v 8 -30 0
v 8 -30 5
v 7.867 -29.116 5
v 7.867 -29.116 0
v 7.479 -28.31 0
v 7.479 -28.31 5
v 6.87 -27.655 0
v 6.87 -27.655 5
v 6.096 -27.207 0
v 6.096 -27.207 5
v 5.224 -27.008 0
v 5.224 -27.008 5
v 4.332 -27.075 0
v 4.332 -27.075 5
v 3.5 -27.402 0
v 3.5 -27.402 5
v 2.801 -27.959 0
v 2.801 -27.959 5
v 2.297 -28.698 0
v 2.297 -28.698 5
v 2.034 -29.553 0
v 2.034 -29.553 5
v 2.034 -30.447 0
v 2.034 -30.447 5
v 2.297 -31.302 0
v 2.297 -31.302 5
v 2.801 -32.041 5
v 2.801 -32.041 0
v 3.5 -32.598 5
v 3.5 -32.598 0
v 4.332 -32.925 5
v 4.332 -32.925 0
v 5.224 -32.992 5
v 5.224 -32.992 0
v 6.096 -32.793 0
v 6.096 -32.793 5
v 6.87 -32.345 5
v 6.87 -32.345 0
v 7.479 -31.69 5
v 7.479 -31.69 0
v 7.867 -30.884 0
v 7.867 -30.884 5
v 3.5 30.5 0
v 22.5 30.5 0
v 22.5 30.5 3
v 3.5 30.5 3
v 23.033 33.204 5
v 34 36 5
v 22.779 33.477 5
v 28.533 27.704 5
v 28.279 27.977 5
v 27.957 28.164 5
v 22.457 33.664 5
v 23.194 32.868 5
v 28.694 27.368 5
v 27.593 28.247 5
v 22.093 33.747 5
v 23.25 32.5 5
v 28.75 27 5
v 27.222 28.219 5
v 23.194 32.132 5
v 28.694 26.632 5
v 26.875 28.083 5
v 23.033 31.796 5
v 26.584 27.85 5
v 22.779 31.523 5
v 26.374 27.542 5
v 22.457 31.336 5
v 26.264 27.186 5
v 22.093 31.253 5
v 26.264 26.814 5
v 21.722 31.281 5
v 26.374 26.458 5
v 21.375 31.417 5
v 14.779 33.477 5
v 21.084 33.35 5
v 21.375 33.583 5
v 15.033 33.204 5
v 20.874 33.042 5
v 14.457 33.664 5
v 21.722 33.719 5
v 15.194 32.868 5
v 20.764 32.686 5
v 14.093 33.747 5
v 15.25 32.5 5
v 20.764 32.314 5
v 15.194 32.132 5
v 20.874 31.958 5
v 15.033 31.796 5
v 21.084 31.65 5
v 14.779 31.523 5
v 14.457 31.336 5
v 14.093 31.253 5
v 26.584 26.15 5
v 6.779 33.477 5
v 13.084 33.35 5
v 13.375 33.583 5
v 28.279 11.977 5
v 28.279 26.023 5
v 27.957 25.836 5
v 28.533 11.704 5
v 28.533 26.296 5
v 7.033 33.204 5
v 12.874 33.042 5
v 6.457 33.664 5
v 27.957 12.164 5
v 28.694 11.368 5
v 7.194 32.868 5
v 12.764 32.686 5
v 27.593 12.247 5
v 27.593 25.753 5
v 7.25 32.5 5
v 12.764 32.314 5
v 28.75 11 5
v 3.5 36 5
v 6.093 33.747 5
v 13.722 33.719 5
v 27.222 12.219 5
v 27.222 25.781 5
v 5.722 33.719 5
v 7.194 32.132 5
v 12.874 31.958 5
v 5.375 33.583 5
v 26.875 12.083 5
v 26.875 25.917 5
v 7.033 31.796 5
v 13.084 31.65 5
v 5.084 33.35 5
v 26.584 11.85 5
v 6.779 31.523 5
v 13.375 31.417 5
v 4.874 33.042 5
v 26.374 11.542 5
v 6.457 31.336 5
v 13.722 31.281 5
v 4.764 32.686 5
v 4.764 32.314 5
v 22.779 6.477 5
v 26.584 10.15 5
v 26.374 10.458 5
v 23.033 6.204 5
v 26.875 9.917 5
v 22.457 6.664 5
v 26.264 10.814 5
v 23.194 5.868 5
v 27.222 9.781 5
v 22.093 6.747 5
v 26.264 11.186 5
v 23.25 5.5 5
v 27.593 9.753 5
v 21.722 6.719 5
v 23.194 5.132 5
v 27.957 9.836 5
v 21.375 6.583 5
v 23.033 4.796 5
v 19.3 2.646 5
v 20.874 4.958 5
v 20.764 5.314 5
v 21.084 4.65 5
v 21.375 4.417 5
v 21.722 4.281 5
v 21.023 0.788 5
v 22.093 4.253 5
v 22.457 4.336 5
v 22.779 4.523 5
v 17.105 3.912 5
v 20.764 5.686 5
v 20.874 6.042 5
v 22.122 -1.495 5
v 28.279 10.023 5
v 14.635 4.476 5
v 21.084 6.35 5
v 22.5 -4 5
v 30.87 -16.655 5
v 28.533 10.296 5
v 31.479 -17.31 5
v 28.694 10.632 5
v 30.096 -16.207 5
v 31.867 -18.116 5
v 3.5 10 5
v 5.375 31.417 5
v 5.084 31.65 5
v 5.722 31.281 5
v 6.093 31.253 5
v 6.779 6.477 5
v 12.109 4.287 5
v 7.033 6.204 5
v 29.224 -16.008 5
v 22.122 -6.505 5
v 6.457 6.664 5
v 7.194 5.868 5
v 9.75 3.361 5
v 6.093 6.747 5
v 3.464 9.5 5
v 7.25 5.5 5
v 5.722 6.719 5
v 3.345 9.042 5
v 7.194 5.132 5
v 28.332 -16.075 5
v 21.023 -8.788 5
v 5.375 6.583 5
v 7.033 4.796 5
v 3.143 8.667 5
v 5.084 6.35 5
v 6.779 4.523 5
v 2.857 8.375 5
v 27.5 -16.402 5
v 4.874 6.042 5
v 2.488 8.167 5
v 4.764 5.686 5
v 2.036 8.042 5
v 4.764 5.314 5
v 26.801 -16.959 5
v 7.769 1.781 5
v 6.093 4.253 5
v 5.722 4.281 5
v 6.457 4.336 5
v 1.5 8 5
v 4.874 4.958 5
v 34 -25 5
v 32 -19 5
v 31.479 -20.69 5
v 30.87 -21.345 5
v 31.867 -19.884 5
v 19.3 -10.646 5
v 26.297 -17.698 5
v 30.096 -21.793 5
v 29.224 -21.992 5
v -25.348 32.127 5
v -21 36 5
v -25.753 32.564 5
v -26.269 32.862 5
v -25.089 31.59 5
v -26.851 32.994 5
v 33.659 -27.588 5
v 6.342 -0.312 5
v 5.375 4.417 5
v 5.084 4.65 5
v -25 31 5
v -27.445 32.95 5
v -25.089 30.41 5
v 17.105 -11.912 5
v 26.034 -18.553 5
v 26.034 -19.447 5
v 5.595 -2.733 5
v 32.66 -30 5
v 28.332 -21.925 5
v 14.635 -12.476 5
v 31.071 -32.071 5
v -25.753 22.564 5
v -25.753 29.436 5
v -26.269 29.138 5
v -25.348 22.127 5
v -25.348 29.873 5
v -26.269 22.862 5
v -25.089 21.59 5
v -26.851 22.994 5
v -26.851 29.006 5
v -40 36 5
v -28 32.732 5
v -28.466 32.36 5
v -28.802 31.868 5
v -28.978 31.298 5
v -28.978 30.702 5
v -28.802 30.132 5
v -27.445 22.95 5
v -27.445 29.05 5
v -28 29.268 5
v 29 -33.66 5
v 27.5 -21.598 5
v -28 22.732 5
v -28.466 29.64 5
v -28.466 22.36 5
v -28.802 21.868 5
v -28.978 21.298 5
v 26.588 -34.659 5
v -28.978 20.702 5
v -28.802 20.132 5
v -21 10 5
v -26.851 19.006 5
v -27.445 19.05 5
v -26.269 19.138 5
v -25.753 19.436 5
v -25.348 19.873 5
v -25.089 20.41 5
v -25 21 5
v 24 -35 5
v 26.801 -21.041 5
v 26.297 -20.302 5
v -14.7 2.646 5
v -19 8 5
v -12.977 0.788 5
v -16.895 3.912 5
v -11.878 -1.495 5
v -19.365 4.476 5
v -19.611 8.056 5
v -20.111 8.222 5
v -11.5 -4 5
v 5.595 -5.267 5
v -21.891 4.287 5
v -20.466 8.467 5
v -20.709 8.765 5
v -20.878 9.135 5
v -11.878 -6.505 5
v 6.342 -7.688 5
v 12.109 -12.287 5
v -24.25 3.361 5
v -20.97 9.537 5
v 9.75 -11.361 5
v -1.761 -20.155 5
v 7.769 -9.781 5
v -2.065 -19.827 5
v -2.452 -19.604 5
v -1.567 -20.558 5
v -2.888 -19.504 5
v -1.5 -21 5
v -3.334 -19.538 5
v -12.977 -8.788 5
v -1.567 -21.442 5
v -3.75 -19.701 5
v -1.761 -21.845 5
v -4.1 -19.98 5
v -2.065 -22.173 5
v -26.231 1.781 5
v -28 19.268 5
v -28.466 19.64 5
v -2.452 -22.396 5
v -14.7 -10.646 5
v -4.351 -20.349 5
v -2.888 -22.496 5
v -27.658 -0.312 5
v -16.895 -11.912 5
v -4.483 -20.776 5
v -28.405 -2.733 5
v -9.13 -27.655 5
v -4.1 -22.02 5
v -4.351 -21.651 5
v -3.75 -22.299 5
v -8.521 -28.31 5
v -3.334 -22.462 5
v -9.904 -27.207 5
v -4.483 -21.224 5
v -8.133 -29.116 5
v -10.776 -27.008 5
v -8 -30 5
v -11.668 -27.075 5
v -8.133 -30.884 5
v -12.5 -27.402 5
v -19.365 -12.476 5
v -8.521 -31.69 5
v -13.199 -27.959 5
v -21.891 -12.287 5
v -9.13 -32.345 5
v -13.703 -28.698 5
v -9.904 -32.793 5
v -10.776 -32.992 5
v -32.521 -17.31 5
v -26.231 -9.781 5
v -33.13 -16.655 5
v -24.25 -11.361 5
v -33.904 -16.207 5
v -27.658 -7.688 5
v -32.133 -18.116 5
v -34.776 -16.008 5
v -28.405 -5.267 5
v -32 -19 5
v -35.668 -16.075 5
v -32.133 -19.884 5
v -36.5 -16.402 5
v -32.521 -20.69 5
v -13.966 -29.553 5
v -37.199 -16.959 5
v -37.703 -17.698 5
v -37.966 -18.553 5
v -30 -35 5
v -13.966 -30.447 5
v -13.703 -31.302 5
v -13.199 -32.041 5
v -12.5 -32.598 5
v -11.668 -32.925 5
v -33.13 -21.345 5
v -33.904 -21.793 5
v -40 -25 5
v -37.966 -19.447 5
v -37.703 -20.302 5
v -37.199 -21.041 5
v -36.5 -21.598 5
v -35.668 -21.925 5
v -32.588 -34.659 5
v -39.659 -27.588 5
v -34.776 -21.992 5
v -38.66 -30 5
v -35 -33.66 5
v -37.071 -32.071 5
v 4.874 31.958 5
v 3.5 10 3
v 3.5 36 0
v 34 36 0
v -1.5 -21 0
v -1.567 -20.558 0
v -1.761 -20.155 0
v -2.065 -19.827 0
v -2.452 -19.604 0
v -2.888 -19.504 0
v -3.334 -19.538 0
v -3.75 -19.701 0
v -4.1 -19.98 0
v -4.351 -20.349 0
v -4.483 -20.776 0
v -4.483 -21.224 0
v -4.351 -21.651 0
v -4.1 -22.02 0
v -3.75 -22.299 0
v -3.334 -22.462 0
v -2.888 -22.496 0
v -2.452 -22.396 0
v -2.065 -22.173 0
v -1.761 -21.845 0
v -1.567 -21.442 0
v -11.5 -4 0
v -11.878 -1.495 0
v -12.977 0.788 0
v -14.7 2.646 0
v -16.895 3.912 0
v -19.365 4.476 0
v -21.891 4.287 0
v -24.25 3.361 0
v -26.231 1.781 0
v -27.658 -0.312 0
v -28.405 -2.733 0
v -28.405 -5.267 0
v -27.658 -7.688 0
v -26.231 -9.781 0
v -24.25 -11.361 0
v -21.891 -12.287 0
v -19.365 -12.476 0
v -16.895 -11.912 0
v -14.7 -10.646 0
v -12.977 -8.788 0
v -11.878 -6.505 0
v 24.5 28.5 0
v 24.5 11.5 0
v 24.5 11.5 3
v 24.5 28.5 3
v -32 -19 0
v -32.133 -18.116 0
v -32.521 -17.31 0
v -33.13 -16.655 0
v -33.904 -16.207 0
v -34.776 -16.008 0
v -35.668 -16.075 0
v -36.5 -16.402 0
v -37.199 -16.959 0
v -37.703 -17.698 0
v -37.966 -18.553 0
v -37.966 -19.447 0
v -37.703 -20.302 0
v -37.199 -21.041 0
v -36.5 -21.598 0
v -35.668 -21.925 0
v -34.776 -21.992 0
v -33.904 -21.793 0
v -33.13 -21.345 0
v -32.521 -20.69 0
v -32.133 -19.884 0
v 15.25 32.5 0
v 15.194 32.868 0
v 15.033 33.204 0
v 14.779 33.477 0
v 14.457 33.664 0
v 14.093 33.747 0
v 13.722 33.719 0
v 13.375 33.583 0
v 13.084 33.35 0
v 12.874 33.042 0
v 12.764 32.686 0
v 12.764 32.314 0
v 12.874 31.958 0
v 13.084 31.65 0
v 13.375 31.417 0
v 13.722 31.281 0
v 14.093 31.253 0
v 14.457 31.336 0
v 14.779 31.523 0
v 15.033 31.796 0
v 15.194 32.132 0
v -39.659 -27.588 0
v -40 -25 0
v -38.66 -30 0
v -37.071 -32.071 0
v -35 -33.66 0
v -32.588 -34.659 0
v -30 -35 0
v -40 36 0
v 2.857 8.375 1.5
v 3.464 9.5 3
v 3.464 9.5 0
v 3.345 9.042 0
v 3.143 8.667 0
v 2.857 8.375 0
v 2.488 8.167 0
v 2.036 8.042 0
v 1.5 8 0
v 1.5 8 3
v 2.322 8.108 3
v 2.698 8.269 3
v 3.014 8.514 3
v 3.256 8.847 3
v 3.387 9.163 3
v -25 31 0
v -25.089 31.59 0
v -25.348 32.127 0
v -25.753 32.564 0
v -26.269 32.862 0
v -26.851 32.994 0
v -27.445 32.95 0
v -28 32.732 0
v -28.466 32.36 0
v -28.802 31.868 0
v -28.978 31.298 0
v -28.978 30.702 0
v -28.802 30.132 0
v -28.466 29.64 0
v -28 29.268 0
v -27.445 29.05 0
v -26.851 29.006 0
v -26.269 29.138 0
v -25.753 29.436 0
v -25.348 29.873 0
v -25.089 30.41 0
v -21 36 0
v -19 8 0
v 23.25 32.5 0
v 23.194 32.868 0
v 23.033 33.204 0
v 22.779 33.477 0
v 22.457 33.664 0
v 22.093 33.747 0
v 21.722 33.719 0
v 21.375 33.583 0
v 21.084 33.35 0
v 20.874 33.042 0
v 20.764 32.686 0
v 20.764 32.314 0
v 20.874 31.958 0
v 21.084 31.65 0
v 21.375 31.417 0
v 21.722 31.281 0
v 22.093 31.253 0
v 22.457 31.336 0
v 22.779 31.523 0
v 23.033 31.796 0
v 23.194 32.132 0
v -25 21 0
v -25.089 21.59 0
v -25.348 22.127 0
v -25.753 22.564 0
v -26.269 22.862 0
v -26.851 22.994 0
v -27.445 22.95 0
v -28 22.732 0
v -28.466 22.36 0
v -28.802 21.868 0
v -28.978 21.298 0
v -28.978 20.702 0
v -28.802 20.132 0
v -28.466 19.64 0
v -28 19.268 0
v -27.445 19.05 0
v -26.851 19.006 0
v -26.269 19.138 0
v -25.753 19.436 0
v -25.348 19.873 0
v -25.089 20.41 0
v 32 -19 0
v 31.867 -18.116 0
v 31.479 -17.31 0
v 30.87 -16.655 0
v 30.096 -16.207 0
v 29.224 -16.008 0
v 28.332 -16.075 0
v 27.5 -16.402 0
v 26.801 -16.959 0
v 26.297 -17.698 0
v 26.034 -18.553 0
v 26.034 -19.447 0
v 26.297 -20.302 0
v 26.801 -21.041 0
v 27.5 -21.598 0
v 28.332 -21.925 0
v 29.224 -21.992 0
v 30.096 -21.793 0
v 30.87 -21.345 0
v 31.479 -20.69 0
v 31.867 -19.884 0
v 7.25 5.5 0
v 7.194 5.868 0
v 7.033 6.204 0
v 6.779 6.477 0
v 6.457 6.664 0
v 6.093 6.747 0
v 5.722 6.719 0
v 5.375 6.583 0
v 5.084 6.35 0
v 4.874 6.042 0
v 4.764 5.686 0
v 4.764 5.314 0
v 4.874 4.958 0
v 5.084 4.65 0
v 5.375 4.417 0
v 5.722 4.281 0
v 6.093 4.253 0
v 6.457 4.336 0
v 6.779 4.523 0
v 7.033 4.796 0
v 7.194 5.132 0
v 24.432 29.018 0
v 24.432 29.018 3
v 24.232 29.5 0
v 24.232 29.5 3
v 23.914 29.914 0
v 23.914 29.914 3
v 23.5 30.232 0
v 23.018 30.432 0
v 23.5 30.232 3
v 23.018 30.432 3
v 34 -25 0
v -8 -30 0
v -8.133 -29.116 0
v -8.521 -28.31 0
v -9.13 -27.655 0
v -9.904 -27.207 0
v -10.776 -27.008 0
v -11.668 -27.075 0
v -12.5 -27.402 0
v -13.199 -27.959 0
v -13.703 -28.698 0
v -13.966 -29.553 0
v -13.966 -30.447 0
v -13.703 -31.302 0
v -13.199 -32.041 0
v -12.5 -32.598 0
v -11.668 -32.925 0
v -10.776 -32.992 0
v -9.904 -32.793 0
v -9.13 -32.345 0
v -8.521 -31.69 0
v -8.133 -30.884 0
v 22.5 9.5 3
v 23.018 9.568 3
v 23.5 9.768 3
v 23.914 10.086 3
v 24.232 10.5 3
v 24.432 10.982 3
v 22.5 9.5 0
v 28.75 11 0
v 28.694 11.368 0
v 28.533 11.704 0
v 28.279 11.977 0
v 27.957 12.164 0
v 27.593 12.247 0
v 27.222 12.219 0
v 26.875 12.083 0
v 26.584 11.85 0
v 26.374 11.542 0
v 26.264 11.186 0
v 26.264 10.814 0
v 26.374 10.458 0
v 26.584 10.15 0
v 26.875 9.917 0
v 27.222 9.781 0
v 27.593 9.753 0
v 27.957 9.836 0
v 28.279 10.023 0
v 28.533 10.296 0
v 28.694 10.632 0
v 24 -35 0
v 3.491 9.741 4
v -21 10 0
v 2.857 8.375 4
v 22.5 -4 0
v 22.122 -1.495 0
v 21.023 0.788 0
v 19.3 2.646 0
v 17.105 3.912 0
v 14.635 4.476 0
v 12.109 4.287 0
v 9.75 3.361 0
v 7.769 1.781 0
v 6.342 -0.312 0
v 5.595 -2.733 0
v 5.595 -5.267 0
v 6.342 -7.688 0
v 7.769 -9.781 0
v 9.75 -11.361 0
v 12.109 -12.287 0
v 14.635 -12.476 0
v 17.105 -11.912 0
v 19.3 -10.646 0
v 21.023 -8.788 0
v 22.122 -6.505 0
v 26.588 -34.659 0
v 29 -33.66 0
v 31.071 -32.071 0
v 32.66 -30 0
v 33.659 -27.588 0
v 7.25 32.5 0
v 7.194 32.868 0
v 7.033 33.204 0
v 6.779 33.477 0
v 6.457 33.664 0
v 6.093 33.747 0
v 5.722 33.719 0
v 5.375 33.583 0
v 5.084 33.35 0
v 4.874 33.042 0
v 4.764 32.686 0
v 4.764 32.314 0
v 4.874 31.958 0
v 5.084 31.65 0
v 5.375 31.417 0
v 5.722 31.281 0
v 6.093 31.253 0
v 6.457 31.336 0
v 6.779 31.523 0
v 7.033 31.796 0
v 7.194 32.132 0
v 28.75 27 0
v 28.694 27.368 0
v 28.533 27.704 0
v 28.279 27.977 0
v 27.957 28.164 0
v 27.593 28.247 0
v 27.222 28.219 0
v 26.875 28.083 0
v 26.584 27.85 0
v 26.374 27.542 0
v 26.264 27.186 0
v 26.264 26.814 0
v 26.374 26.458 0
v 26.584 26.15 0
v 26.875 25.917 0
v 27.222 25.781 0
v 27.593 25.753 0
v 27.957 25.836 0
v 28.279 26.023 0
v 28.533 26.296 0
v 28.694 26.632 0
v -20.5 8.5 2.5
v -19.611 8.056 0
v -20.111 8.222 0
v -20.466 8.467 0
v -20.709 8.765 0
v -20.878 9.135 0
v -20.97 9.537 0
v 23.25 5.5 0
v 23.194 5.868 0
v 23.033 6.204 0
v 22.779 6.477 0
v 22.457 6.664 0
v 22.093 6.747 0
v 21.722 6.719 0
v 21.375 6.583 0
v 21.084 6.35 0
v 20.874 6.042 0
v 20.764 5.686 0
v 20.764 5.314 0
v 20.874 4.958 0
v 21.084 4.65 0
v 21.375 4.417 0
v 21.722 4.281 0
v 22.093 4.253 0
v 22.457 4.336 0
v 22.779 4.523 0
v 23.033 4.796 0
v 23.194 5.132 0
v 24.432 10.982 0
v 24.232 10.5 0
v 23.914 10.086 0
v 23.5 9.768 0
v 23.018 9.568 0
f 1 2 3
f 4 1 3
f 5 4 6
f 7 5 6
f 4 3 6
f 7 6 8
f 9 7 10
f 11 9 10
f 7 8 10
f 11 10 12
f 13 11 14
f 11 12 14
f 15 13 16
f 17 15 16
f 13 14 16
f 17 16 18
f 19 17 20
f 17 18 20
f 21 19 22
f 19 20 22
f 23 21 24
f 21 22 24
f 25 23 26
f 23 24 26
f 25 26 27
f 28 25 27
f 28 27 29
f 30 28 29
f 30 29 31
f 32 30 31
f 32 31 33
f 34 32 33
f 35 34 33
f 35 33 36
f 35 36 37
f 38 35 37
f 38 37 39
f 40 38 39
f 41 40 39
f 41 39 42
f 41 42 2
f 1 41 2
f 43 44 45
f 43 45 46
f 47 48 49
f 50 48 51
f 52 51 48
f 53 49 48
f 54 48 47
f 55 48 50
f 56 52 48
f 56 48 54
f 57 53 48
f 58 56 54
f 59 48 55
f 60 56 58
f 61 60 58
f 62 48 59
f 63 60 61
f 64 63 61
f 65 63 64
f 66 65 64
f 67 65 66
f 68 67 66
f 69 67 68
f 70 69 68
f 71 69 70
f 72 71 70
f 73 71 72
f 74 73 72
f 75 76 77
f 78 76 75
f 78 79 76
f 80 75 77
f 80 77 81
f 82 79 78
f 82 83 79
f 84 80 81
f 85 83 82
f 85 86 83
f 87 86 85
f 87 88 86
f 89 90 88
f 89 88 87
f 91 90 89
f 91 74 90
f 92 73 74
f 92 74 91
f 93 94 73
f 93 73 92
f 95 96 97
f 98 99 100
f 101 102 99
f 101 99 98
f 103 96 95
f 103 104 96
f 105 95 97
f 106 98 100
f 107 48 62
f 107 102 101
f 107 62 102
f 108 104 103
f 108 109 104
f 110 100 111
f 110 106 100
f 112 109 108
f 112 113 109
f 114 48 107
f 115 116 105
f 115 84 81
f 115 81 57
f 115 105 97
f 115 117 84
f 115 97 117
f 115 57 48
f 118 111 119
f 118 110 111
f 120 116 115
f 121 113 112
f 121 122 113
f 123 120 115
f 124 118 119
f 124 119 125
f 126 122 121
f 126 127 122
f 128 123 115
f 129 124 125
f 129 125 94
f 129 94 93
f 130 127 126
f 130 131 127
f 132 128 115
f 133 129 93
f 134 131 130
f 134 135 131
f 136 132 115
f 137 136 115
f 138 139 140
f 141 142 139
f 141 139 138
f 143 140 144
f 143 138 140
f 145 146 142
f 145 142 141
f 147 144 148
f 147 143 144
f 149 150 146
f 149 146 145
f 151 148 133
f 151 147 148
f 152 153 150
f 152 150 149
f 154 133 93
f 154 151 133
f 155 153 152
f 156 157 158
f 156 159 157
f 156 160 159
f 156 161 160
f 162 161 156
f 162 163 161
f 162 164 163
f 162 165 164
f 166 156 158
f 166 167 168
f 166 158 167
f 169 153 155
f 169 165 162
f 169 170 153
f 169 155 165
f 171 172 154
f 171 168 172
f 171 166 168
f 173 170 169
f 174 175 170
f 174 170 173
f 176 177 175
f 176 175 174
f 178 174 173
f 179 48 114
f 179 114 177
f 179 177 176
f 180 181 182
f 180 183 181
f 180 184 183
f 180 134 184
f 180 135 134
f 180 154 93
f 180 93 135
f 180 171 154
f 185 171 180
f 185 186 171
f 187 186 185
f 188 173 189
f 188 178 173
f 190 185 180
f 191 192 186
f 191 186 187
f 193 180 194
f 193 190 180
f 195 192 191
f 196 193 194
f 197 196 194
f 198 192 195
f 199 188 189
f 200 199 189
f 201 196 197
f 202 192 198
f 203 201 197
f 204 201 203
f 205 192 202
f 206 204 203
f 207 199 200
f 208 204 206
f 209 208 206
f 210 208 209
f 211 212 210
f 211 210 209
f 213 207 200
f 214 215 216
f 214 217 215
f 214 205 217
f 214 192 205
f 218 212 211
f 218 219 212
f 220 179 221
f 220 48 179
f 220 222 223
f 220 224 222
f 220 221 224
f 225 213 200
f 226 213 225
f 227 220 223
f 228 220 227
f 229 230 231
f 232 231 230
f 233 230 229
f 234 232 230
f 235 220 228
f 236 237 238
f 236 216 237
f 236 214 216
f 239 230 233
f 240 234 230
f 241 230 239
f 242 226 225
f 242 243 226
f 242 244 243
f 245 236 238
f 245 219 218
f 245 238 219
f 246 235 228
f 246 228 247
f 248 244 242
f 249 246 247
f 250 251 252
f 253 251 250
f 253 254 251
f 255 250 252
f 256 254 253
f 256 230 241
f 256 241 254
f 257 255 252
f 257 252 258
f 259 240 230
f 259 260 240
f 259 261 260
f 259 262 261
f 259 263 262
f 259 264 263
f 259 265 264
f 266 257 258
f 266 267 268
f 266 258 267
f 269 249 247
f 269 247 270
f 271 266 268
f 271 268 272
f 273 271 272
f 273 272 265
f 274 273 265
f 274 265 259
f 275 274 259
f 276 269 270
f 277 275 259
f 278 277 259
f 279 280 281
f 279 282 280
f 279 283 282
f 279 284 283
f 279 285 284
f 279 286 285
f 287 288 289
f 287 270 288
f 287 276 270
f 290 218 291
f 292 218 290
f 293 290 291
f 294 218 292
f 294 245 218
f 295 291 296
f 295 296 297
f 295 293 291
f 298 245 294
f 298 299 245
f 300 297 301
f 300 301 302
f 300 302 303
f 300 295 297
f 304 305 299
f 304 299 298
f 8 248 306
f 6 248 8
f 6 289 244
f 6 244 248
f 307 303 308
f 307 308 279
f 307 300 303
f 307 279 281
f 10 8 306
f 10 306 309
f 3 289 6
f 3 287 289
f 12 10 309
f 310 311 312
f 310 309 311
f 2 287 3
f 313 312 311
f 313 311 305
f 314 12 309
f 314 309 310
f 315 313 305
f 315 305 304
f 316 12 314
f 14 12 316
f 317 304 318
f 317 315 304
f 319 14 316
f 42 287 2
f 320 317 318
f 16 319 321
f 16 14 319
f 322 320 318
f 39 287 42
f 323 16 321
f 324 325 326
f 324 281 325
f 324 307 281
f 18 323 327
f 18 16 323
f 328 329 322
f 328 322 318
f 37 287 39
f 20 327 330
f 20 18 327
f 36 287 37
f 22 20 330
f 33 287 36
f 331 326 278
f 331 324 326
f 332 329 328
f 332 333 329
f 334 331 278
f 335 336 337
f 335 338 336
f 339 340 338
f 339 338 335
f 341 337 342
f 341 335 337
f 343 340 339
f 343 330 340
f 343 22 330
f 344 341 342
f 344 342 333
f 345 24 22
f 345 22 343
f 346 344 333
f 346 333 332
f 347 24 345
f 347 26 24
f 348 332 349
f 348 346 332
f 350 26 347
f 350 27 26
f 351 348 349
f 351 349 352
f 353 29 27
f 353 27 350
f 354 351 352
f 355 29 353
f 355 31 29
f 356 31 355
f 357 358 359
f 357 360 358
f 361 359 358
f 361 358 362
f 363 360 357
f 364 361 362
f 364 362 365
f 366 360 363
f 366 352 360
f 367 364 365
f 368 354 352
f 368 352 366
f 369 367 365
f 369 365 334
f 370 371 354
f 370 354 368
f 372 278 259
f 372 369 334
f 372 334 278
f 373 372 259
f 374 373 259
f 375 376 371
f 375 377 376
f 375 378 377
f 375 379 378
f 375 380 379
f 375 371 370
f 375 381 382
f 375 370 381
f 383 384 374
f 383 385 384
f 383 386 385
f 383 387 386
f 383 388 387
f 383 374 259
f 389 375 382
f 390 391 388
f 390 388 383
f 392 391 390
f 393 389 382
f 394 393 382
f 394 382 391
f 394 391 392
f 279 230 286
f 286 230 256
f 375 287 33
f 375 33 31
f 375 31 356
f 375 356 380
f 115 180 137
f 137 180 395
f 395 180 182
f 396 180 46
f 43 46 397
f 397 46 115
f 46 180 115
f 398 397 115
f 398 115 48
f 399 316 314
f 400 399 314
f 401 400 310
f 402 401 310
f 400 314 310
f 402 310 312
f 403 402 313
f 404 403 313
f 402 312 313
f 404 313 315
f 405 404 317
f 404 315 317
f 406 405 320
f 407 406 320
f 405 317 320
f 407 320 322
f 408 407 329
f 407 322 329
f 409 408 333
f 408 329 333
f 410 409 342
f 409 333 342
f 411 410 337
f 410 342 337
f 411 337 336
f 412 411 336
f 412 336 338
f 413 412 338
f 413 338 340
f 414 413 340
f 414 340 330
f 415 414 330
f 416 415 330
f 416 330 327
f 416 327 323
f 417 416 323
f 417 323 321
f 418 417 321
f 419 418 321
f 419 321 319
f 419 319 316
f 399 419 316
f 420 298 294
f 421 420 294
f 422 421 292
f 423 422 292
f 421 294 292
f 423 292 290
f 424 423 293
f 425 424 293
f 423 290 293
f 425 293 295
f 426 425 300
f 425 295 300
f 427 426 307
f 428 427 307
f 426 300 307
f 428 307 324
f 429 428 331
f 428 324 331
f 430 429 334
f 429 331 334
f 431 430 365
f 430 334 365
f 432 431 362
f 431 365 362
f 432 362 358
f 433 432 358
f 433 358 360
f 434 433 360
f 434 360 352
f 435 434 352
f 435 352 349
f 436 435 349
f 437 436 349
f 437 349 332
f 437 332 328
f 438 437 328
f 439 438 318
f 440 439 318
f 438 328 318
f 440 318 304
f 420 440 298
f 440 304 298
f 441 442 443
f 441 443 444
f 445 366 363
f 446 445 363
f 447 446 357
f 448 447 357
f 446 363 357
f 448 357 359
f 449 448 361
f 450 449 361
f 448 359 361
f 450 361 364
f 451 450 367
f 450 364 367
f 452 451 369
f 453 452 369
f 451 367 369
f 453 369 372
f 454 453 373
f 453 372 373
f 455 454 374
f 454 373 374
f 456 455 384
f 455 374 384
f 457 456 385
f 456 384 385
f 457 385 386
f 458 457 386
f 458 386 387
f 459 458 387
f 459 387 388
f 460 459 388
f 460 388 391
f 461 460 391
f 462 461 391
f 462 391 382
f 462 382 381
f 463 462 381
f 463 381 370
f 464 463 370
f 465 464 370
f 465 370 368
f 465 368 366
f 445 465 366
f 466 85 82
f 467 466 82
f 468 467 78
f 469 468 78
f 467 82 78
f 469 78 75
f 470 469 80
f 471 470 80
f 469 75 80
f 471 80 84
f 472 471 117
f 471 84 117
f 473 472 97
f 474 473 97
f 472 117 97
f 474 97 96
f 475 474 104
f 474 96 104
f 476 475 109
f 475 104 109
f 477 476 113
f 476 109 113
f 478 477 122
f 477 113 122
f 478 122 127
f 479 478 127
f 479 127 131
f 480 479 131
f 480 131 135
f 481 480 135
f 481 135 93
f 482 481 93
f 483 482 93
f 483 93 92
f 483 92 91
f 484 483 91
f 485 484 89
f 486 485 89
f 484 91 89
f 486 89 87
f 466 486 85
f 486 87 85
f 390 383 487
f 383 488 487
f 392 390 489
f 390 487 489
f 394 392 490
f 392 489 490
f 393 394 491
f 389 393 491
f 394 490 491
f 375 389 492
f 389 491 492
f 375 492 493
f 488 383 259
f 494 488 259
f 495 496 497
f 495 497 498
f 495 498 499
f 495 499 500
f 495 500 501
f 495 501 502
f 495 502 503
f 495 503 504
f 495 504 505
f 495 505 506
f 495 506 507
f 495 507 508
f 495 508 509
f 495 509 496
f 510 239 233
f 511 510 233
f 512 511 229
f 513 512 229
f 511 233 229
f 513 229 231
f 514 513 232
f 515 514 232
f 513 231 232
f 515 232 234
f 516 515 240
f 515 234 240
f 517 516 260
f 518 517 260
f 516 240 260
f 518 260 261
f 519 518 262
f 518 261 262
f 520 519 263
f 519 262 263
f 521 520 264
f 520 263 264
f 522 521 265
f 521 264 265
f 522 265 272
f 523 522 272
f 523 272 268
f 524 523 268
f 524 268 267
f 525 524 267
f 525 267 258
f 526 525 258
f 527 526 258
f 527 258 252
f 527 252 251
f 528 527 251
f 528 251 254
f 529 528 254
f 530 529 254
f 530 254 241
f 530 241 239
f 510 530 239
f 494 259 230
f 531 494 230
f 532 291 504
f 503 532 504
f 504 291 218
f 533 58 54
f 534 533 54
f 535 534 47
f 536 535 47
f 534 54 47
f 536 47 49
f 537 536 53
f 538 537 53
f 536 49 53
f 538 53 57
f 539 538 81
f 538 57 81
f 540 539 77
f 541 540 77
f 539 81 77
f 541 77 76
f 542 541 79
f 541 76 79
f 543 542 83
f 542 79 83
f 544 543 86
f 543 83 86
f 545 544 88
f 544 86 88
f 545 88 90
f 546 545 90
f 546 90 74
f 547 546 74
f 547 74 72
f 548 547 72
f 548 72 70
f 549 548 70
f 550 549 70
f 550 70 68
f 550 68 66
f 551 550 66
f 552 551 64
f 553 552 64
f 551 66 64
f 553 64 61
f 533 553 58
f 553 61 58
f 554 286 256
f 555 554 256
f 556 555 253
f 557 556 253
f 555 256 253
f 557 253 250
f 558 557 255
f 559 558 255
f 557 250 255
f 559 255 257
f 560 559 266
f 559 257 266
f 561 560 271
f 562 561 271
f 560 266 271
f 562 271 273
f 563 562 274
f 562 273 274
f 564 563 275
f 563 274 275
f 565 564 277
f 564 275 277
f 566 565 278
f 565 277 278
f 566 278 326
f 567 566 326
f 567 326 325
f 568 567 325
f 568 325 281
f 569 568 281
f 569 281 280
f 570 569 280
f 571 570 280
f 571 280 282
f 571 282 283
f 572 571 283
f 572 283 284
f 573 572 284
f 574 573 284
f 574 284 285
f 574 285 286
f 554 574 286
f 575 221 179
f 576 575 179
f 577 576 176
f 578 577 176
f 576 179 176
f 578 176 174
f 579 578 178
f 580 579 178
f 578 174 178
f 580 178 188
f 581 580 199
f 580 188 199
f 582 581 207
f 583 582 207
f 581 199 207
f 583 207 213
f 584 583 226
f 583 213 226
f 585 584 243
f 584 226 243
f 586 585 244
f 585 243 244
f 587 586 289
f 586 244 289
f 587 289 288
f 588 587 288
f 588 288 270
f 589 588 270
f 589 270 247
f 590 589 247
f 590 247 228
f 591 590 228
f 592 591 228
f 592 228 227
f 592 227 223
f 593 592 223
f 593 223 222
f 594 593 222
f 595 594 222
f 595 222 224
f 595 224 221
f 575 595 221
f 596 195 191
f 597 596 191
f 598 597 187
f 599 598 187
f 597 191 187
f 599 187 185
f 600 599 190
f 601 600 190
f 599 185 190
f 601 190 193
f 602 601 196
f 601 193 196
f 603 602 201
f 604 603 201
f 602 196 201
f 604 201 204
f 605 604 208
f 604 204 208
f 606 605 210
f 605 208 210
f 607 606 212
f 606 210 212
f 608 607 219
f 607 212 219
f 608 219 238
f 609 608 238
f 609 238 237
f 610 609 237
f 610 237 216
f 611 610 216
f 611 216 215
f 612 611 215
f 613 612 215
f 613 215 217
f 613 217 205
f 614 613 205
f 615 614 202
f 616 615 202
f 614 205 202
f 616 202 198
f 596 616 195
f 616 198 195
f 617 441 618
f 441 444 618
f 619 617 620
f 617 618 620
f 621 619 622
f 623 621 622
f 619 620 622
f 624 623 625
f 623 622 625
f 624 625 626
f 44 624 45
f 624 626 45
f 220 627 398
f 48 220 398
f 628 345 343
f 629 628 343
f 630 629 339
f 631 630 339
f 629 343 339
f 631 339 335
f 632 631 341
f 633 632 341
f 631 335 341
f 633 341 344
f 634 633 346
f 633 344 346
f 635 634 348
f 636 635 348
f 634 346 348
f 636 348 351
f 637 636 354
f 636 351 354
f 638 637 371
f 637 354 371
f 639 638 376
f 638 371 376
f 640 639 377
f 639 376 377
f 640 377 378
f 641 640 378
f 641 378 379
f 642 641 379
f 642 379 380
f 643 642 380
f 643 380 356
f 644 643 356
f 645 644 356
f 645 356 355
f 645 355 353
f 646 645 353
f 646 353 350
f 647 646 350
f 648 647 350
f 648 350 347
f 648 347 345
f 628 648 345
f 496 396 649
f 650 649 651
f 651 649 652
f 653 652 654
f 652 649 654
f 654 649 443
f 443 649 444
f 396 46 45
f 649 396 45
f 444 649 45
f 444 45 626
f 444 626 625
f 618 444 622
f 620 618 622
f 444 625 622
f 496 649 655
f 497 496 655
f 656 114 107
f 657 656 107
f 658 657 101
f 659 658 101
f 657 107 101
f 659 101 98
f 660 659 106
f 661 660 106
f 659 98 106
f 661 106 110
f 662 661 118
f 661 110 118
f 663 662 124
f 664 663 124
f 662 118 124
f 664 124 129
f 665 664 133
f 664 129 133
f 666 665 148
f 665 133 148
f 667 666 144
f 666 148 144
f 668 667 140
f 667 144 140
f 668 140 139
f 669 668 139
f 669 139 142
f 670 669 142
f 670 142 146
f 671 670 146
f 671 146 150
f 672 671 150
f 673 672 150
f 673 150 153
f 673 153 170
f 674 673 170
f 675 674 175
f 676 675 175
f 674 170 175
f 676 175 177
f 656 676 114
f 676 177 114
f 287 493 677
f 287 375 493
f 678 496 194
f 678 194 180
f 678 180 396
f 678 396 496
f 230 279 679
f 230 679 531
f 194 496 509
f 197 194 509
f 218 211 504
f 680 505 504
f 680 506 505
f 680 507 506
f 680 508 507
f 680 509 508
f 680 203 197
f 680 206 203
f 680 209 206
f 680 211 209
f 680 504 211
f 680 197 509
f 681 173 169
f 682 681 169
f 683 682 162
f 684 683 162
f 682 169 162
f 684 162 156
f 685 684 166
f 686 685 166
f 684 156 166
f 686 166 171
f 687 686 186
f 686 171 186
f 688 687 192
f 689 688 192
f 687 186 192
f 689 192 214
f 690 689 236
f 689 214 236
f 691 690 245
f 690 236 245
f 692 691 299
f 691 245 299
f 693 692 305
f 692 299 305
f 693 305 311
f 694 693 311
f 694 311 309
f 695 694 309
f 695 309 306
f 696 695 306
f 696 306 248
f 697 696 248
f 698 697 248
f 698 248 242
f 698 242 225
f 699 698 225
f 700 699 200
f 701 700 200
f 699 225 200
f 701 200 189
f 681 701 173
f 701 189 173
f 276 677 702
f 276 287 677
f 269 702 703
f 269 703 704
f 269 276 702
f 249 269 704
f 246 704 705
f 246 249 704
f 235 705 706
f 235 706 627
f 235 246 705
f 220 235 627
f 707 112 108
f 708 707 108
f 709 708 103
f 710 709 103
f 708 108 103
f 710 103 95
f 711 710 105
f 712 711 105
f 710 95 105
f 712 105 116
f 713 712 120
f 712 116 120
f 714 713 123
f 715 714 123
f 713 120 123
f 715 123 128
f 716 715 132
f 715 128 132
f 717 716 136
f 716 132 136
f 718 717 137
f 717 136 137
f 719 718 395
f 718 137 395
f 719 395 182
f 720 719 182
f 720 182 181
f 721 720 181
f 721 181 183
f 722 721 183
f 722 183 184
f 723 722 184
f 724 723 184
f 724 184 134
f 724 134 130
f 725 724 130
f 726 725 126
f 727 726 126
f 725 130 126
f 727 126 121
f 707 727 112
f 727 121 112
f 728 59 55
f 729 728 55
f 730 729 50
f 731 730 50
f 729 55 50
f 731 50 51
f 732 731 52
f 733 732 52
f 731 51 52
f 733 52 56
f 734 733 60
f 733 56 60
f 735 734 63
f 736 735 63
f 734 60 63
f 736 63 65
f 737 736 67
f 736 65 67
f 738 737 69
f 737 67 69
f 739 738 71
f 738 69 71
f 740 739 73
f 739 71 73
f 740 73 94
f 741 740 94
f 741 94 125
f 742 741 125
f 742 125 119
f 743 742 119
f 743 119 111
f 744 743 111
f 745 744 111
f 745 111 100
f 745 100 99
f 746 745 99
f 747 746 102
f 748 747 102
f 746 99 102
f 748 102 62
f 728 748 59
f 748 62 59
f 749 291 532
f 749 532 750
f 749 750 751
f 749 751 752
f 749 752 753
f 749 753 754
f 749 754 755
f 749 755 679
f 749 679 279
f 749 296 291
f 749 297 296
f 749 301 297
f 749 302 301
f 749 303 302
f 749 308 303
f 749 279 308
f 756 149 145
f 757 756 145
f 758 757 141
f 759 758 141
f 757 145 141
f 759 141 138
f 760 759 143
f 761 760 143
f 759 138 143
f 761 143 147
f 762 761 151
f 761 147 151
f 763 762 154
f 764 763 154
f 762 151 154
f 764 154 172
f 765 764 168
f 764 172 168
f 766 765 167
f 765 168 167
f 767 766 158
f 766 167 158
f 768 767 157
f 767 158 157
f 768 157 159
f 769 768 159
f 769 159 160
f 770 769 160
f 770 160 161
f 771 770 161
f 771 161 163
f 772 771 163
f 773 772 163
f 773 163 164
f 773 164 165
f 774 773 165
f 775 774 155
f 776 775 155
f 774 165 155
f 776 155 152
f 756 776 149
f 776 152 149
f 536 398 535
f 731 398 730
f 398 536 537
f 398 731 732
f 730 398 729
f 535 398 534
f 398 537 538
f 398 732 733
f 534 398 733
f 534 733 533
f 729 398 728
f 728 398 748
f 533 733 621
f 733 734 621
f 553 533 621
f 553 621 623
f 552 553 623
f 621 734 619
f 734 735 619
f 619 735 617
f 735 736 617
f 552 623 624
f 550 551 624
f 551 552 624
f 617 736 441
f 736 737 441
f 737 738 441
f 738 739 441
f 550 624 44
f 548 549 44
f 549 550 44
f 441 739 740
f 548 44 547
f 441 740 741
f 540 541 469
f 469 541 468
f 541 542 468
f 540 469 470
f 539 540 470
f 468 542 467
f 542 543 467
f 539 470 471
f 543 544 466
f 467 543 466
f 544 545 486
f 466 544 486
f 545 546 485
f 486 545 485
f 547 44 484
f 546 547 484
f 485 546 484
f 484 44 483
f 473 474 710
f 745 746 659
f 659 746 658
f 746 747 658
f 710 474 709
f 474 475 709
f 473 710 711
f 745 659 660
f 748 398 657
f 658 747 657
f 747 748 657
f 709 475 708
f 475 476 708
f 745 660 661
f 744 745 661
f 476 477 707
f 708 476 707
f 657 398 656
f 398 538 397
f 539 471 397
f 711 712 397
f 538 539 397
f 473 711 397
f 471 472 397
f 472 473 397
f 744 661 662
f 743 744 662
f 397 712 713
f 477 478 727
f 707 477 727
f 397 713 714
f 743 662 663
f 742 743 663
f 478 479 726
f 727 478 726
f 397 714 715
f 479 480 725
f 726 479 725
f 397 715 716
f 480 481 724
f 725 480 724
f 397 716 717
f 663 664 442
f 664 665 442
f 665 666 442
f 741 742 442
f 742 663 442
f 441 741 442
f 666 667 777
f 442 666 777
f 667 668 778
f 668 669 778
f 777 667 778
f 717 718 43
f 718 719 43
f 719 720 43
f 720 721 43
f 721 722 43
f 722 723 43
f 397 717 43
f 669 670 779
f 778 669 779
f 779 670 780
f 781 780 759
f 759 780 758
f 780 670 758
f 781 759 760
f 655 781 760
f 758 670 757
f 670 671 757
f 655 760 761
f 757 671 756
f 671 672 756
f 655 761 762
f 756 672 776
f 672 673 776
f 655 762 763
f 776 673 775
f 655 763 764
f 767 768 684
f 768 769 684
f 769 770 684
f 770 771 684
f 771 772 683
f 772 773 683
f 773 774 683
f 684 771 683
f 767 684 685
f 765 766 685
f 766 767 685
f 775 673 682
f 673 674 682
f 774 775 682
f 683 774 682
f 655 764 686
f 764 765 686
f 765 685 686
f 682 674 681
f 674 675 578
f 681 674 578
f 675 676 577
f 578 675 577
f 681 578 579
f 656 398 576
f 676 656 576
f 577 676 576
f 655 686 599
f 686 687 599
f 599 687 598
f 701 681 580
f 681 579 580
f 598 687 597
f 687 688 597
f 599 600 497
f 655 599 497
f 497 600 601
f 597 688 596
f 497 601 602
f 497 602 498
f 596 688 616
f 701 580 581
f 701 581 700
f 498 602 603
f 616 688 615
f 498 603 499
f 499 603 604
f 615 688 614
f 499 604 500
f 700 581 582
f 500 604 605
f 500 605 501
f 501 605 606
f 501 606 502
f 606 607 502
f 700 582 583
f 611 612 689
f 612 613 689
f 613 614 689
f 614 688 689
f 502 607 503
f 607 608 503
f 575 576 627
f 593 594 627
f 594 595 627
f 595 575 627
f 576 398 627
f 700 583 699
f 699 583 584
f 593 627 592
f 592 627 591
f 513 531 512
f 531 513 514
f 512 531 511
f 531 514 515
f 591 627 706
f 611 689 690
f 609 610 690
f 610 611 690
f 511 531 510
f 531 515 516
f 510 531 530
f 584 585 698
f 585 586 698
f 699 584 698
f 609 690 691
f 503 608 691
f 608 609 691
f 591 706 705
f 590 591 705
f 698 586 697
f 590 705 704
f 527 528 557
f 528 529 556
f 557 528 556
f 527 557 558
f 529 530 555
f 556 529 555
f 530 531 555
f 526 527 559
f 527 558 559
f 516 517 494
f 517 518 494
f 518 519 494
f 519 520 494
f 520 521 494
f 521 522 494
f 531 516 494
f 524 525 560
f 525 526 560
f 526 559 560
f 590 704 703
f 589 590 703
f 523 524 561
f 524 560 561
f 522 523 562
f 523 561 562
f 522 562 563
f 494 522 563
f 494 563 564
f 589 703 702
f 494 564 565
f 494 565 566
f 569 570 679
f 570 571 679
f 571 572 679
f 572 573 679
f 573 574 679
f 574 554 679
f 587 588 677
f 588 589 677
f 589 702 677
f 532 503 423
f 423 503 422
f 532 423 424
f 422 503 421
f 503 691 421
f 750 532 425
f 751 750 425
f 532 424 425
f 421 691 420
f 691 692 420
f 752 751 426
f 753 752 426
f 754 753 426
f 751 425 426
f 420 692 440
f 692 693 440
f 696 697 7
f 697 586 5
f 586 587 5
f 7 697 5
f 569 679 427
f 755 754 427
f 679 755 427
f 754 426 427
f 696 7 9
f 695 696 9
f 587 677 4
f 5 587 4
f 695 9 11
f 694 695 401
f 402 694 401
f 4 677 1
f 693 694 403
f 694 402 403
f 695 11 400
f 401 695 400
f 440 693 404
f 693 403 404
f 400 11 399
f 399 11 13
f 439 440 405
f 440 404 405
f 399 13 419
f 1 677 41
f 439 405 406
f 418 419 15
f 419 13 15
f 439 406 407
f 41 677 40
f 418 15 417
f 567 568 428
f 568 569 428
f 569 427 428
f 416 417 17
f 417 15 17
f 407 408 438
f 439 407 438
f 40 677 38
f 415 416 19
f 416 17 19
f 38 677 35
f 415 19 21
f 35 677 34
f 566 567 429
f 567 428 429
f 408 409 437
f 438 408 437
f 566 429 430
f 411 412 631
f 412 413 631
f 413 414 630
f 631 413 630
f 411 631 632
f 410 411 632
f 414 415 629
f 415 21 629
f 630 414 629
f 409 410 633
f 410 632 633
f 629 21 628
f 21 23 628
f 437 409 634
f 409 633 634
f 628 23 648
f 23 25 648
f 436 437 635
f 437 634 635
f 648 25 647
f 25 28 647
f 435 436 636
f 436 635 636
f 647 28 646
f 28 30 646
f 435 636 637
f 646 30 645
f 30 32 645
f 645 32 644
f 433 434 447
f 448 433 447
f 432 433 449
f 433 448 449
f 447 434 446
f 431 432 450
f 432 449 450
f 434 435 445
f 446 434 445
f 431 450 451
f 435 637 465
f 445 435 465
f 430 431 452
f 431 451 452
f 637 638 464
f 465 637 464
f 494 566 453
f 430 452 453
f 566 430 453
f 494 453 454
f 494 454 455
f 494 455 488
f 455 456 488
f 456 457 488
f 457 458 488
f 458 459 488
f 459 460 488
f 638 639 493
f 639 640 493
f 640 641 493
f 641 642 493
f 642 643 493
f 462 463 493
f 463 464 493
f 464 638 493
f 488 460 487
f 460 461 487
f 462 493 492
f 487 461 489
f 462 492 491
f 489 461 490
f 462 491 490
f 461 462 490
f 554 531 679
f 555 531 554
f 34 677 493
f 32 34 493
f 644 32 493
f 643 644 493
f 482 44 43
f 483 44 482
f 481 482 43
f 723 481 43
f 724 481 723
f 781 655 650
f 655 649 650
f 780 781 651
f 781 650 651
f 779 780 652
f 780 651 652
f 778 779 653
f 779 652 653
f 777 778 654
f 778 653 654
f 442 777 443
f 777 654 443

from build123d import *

# Parameters (mm, degrees)
SZKIC1_W                    = 54
SZKIC1_H                    = 71
DODANIE_WYCI_GNI_CIE1_DEPTH = 5
SZKIC2_W                    = 23.5
SZKIC2_H                    = 28
WYTNIJ_WYCI_GNI_CIE1_DEPTH  = 5
SZKIC3_W                    = 21
SZKIC3_H                    = 21
WYTNIJ_WYCI_GNI_CIE2_DEPTH  = 3
SZKIC4_R                    = 1.25
WYTNIJ_WYCI_GNI_CIE3_DEPTH  = 5
SZKIC5_W                    = 20
SZKIC5_H                    = 43
DODANIE_WYCI_GNI_CIE2_DEPTH = 5
SZKIC6_R                    = 8.5
WYTNIJ_WYCI_GNI_CIE4_DEPTH  = 5
SZKIC7_R                    = 3
WYTNIJ_WYCI_GNI_CIE5_DEPTH  = 10
ZAOKR_GLENIE3_R             = 10
SZKIC8_W                    = 19
SZKIC8_H                    = 28
DODANIE_WYCI_GNI_CIE3_DEPTH = 5
ZAOKR_GLENIE2_SIZE          = 2
SZKIC9_R                    = 2
WYTNIJ_WYCI_GNI_CIE6_DEPTH  = 10
SZKIC10_R                   = 1.5
WYTNIJ_WYCI_GNI_CIE7_DEPTH  = 10
ZAOKR_GLENIE4_R             = 2


with BuildPart() as part:
    # Szkic1 → Dodanie-wyciągnięcie1 (new body)
    with BuildSketch(Plane.XY):
        with Locations((7, 0.5)):
            Rectangle(SZKIC1_W, SZKIC1_H)
    extrude(amount=DODANIE_WYCI_GNI_CIE1_DEPTH)

    # Szkic2 → Wytnij-wyciągnięcie1 (cut)
    with BuildSketch(Plane.XY.offset(5)):
        with Locations((-8.25, 22)):
            Rectangle(SZKIC2_W, SZKIC2_H)
    extrude(amount=-WYTNIJ_WYCI_GNI_CIE1_DEPTH, mode=Mode.SUBTRACT)

    # Szkic3 → Wytnij-wyciągnięcie2 (cut)
    with BuildSketch(Plane(origin=(0, 0, 0), x_dir=(-1, 0, 0), z_dir=(0, 0, -1))):
        with Locations((-14, 20)):
            Rectangle(SZKIC3_W, SZKIC3_H)
    extrude(amount=-WYTNIJ_WYCI_GNI_CIE2_DEPTH, mode=Mode.SUBTRACT)

    # Szkic4 → Wytnij-wyciągnięcie3 (cut)
    with BuildSketch(Plane.XY.offset(5)):
        with Locations((6, 32.5)):
            Circle(SZKIC4_R)
        with Locations((14, 32.5)):
            Circle(SZKIC4_R)
        with Locations((22, 32.5)):
            Circle(SZKIC4_R)
        with Locations((22, 5.5)):
            Circle(SZKIC4_R)
        with Locations((6, 5.5)):
            Circle(SZKIC4_R)
        with Locations((27.5, 27)):
            Circle(SZKIC4_R)
        with Locations((27.5, 11)):
            Circle(SZKIC4_R)
    extrude(amount=-WYTNIJ_WYCI_GNI_CIE3_DEPTH, mode=Mode.SUBTRACT)

    # Szkic5 → Dodanie-wyciągnięcie2 (add)
    with BuildSketch(Plane.XY.offset(5)):
        with Locations((-30, -13.5)):
            Rectangle(SZKIC5_W, SZKIC5_H)
    extrude(amount=-DODANIE_WYCI_GNI_CIE2_DEPTH)

    # Szkic6 → Wytnij-wyciągnięcie4 (cut)
    with BuildSketch(Plane.XY.offset(5)):
        with Locations((-20, -4)):
            Circle(SZKIC6_R)
        with Locations((14, -4)):
            Circle(SZKIC6_R)
    extrude(amount=-WYTNIJ_WYCI_GNI_CIE4_DEPTH, mode=Mode.SUBTRACT)

    # Szkic7 → Wytnij-wyciągnięcie5 (cut)
    with BuildSketch(Plane.XY.offset(5)):
        with Locations((-11, -30)):
            Circle(SZKIC7_R)
        with Locations((5, -30)):
            Circle(SZKIC7_R)
        with Locations((-35, -19)):
            Circle(SZKIC7_R)
        with Locations((29, -19)):
            Circle(SZKIC7_R)
    extrude(amount=-WYTNIJ_WYCI_GNI_CIE5_DEPTH, mode=Mode.SUBTRACT)

    # Zaokrąglenie3
    zaokr_glenie3_edges = [part.edges().sort_by_distance(p)[0] for p in [
        (-40, -35, 2.5),
        (34, -35, 2.5),
    ]]
    fillet(zaokr_glenie3_edges, radius=ZAOKR_GLENIE3_R)

    # Szkic8 → Dodanie-wyciągnięcie3 (add)
    with BuildSketch(Plane.XY.offset(5)):
        with Locations((-30.5, 22)):
            Rectangle(SZKIC8_W, SZKIC8_H)
    extrude(amount=-DODANIE_WYCI_GNI_CIE3_DEPTH)

    # Zaokrąglenie2
    # a fillet whose section is not a circle: 2 mm, written as the material it adds along each edge
    with BuildSketch(Plane(origin=(3.5, 8, 5), x_dir=(0, 1, 0), z_dir=(0, 0, -1))) as zaokr_glenie2_piece_1_section:
        with BuildLine():
            Bezier((ZAOKR_GLENIE2_SIZE, 0), (0, 0), (0, -ZAOKR_GLENIE2_SIZE), weights=[1, 1, 1])
            Line((0, -ZAOKR_GLENIE2_SIZE), (0, 0))
            Line((0, 0), (ZAOKR_GLENIE2_SIZE, 0))
        make_face()
    zaokr_glenie2_piece_1 = extrude(amount=5, mode=Mode.PRIVATE)
    zaokr_glenie2_piece_1 = split(zaokr_glenie2_piece_1, bisect_by=Plane(origin=(3.5, 9.5, 5), z_dir=(0, 1, 0)), keep=Keep.TOP, mode=Mode.PRIVATE)
    zaokr_glenie2_piece_1 = split(zaokr_glenie2_piece_1, bisect_by=Plane(origin=(3.5, 8, 3), z_dir=(0, 0, 1)), keep=Keep.TOP, mode=Mode.PRIVATE)
    add(zaokr_glenie2_piece_1)
    with BuildSketch(Plane(origin=(3.5, 8, 5), x_dir=(0, 1, 0), z_dir=(0, 0, -1))) as zaokr_glenie2_piece_2_section:
        with BuildLine():
            Bezier((ZAOKR_GLENIE2_SIZE, 0), (0, 0), (0, -ZAOKR_GLENIE2_SIZE), weights=[1, 1, 1])
            Line((0, -ZAOKR_GLENIE2_SIZE), (0, 0))
            Line((0, 0), (ZAOKR_GLENIE2_SIZE, 0))
        make_face()
    zaokr_glenie2_piece_2 = extrude(amount=5, mode=Mode.PRIVATE)
    zaokr_glenie2_piece_2 = split(zaokr_glenie2_piece_2, bisect_by=Plane(origin=(3.5, 9.5, 5), z_dir=(0, -1, 0)), keep=Keep.TOP, mode=Mode.PRIVATE)
    zaokr_glenie2_piece_2 = split(zaokr_glenie2_piece_2, bisect_by=Plane(origin=(3.5, 8, 3), z_dir=(0, 0, 1)), keep=Keep.TOP, mode=Mode.PRIVATE)
    add(zaokr_glenie2_piece_2)
    with BuildSketch(Plane(origin=(3.5, 8, 5), x_dir=(0, 1, 0), z_dir=(0, 0, -1))) as zaokr_glenie2_piece_3_section:
        with BuildLine():
            Bezier((ZAOKR_GLENIE2_SIZE, 0), (0, 0), (0, -ZAOKR_GLENIE2_SIZE), weights=[1, 1, 1])
            Line((0, -ZAOKR_GLENIE2_SIZE), (0, 0))
            Line((0, 0), (ZAOKR_GLENIE2_SIZE, 0))
        make_face()
    zaokr_glenie2_piece_3 = extrude(amount=5, mode=Mode.PRIVATE)
    zaokr_glenie2_piece_3 = split(zaokr_glenie2_piece_3, bisect_by=Plane(origin=(3.5, 9.5, 5), z_dir=(0, -1, 0)), keep=Keep.TOP, mode=Mode.PRIVATE)
    zaokr_glenie2_piece_3 = split(zaokr_glenie2_piece_3, bisect_by=Plane(origin=(3.5, 8, 3), z_dir=(0, 0, -1)), keep=Keep.TOP, mode=Mode.PRIVATE)
    add(zaokr_glenie2_piece_3)
    with BuildSketch(Plane(origin=(-21, 8, 5), x_dir=(1, 0, 0), z_dir=(0, 0, -1))) as zaokr_glenie2_piece_4:
        with BuildLine():
            Bezier((ZAOKR_GLENIE2_SIZE, 0), (0, 0), (0, -ZAOKR_GLENIE2_SIZE), weights=[1, 1, 1])
            Line((0, -ZAOKR_GLENIE2_SIZE), (0, 0))
            Line((0, 0), (ZAOKR_GLENIE2_SIZE, 0))
        make_face()
    extrude(amount=5)

    # Szkic9 → Wytnij-wyciągnięcie6 (cut)
    with BuildSketch(Plane.XY.offset(5)):
        with Locations((-27, 31)):
            Circle(SZKIC9_R)
        with Locations((-27, 21)):
            Circle(SZKIC9_R)
    extrude(amount=-WYTNIJ_WYCI_GNI_CIE6_DEPTH, mode=Mode.SUBTRACT)

    # Szkic10 → Wytnij-wyciągnięcie7 (cut)
    with BuildSketch(Plane.XY.offset(5)):
        with Locations((-3, -21)):
            Circle(SZKIC10_R)
    extrude(amount=-WYTNIJ_WYCI_GNI_CIE7_DEPTH, mode=Mode.SUBTRACT)

    # Zaokrąglenie4
    zaokr_glenie4_edges = [part.edges().sort_by_distance(p)[0] for p in [
        (24.5, 9.5, 1.5),
        (24.5, 30.5, 1.5),
    ]]
    fillet(zaokr_glenie4_edges, radius=ZAOKR_GLENIE4_R)


solid = part.part
